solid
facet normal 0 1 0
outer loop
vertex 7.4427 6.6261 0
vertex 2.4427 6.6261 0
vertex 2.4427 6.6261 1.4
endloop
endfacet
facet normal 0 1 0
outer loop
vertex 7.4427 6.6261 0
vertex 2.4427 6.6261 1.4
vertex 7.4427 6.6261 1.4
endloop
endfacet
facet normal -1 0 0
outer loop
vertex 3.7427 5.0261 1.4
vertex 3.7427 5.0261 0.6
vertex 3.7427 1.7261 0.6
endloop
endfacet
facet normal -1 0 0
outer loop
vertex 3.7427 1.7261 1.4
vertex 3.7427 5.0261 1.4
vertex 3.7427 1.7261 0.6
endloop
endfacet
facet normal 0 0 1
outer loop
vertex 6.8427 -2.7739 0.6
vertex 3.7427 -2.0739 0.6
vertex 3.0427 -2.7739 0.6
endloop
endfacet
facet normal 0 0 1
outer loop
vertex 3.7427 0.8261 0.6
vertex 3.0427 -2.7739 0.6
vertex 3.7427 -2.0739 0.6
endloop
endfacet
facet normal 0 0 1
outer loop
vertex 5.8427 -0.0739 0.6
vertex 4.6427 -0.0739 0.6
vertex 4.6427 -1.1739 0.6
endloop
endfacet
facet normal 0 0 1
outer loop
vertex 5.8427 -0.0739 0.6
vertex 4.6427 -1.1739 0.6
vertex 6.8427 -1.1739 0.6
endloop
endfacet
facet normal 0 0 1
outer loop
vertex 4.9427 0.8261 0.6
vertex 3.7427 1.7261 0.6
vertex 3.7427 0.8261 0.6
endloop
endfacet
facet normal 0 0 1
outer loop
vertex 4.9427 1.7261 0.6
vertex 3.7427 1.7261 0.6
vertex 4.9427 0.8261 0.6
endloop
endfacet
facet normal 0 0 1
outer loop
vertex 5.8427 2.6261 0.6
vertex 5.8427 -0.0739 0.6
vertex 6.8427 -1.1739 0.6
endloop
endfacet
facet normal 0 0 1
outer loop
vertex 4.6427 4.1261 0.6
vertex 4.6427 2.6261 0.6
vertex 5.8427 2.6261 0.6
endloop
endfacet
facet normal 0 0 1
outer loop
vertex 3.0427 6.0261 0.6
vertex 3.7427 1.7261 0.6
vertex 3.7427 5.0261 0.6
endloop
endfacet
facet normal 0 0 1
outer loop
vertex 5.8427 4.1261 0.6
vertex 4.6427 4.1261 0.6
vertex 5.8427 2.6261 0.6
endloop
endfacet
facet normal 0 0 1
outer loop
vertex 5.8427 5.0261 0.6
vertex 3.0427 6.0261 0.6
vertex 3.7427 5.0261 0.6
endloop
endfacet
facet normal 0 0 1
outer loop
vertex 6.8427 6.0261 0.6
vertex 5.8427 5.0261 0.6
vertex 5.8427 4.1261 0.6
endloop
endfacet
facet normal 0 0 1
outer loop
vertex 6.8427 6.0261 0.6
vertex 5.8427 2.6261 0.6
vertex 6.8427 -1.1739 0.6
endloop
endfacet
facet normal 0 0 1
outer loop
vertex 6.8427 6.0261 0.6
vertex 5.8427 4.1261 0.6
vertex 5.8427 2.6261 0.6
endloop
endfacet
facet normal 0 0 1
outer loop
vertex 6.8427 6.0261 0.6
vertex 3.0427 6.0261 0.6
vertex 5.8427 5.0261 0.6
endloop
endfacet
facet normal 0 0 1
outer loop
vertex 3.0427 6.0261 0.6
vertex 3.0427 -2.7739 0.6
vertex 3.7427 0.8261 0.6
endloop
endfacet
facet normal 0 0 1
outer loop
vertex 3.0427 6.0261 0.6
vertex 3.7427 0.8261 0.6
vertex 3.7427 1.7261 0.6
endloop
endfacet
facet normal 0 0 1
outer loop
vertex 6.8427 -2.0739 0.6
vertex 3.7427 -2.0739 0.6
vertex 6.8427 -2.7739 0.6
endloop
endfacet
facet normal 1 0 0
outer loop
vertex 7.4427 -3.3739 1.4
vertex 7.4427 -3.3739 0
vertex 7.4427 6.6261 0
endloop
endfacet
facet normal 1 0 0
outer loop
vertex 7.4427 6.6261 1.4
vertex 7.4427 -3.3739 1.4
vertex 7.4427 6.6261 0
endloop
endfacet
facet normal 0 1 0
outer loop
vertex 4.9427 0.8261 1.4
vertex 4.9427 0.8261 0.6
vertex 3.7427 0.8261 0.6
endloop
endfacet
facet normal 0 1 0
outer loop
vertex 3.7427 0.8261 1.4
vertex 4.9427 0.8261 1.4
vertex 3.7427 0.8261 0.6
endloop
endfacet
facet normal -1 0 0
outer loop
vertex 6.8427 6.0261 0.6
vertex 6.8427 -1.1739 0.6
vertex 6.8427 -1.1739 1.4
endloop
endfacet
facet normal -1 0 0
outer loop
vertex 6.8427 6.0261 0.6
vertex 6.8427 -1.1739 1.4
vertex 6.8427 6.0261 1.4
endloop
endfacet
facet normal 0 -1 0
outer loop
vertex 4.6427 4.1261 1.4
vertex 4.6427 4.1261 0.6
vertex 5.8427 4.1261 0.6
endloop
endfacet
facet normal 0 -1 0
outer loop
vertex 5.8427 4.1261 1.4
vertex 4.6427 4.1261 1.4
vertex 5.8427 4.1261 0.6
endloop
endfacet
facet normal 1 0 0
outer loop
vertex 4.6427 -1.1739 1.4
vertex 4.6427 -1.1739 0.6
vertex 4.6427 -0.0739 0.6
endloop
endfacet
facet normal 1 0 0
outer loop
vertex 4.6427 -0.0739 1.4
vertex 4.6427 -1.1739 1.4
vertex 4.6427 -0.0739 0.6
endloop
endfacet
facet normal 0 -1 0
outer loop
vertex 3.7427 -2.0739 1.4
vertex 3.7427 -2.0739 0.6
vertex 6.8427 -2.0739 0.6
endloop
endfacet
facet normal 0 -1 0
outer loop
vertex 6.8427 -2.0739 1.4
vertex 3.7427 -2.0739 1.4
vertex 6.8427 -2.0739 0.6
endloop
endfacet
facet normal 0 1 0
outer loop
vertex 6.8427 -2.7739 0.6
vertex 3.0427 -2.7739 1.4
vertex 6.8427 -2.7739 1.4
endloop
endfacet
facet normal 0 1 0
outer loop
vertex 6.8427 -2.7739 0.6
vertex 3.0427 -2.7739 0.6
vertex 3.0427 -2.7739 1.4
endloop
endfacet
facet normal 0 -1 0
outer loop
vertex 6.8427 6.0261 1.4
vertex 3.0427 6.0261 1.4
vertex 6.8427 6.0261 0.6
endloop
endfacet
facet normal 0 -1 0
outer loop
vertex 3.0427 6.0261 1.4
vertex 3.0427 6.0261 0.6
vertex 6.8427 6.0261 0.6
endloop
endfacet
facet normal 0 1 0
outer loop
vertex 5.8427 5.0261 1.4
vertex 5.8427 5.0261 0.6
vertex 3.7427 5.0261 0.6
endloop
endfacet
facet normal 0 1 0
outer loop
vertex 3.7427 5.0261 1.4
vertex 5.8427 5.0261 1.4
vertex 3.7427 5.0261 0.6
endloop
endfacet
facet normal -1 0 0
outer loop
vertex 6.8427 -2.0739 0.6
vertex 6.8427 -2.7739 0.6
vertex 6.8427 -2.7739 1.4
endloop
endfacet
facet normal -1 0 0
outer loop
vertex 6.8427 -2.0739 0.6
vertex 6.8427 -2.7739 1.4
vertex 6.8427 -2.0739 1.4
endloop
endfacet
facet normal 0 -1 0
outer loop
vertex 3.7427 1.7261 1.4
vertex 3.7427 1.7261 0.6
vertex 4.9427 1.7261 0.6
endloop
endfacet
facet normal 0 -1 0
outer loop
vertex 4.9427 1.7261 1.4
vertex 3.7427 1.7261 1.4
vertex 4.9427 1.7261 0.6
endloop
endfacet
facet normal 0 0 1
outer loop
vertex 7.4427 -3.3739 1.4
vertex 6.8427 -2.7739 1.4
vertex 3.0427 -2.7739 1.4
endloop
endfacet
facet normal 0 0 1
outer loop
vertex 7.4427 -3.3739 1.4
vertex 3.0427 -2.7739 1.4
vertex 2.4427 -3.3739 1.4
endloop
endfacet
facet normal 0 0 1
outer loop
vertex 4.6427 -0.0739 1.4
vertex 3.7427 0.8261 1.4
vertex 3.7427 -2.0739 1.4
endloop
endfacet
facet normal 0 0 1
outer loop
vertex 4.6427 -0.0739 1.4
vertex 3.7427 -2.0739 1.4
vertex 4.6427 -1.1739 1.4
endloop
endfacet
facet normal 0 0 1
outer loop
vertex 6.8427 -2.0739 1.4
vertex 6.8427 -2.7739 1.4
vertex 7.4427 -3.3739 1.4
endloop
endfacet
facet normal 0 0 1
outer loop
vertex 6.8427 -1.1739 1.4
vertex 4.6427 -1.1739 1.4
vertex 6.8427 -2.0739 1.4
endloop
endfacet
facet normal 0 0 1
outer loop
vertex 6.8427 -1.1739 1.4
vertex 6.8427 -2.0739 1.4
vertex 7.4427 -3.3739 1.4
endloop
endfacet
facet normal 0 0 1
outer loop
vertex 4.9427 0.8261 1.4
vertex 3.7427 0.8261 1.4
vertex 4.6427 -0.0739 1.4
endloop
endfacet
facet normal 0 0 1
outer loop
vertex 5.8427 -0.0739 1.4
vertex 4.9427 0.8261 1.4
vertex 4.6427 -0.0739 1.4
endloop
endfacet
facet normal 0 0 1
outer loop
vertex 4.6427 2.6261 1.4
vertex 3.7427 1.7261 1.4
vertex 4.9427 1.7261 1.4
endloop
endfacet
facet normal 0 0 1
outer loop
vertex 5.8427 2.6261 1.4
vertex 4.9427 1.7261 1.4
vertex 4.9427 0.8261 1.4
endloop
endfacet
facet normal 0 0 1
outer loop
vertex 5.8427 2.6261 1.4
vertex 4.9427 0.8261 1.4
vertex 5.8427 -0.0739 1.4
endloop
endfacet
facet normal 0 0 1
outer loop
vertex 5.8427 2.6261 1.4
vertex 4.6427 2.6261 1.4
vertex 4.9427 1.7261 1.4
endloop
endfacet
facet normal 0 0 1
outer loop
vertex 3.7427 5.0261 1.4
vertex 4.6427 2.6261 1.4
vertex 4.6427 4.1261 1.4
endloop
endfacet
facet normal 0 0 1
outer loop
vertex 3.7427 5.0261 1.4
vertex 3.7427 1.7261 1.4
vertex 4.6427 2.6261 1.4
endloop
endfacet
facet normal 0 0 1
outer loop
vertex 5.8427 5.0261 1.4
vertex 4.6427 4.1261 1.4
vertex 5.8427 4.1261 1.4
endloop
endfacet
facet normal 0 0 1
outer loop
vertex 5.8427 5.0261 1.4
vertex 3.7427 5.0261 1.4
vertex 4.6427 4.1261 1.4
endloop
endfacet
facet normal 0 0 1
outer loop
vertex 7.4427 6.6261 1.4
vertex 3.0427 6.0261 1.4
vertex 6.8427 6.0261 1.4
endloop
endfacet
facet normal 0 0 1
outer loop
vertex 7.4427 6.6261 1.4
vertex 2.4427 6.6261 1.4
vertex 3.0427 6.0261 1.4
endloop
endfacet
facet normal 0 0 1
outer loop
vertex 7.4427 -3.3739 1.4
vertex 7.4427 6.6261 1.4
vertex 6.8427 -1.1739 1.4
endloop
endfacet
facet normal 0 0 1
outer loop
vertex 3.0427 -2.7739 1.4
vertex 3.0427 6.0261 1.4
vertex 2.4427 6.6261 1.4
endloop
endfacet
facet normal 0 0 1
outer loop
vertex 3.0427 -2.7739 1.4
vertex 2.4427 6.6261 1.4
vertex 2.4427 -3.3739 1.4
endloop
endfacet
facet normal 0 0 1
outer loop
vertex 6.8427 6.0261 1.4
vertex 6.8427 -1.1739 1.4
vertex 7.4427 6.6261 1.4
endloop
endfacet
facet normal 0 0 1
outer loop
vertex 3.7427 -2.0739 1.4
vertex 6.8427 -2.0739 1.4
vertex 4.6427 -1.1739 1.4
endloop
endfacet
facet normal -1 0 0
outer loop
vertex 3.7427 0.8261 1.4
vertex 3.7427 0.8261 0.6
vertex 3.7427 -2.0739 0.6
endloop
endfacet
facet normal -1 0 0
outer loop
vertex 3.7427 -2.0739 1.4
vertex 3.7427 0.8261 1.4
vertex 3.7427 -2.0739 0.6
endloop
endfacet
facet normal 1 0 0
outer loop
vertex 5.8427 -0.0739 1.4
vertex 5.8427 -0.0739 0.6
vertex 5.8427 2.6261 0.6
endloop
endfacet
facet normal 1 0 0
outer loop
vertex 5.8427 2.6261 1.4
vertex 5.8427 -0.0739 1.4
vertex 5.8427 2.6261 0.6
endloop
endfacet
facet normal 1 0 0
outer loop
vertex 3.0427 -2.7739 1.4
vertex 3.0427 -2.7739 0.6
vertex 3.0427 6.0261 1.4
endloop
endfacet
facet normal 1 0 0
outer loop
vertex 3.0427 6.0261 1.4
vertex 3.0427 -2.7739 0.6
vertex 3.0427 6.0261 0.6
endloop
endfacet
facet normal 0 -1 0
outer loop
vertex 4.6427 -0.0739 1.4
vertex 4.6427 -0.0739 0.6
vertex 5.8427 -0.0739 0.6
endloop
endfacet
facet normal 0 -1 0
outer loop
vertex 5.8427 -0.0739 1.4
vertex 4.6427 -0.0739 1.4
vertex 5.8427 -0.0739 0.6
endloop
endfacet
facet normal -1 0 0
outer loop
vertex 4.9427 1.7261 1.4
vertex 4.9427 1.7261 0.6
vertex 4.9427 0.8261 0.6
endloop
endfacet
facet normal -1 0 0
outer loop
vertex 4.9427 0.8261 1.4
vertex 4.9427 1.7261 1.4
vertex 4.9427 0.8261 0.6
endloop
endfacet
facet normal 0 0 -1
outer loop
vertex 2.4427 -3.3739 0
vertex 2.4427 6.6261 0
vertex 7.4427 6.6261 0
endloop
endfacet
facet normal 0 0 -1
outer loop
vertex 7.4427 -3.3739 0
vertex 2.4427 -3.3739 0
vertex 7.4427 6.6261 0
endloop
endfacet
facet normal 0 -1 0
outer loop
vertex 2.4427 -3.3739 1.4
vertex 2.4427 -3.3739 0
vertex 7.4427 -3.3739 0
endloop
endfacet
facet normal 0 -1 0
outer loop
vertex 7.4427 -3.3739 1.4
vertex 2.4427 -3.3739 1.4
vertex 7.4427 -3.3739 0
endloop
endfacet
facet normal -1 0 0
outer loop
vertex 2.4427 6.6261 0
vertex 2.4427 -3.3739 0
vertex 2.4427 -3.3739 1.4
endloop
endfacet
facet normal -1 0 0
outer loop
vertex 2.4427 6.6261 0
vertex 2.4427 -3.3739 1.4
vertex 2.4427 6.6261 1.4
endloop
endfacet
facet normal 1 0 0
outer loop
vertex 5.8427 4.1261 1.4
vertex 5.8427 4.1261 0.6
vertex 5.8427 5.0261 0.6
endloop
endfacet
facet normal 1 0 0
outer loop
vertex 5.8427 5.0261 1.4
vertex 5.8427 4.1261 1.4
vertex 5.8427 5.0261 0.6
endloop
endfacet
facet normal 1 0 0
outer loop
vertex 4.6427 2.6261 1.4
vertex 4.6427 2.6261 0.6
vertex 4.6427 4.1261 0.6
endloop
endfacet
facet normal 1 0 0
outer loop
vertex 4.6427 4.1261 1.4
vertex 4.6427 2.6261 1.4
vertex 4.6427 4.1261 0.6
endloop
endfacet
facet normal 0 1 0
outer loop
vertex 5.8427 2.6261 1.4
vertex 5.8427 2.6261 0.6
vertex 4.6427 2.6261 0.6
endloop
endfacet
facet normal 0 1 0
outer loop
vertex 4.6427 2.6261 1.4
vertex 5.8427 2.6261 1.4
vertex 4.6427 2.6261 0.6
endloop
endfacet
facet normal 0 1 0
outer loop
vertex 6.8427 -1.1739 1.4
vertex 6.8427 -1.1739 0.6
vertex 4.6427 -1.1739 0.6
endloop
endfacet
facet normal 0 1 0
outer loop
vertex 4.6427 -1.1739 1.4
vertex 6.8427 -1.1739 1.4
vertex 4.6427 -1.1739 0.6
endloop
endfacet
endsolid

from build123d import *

# Parameters (mm, degrees)
F0_W     = 5
F0_H     = 10
F1_DEPTH = 1.4
F2_T     = -0.6
F4_DEPTH = 0.8


with BuildPart() as f1:
    # F0 (on Top) → F1 (new body)
    with BuildSketch(Plane.XY):
        with Locations((4.9427011982, 1.6260683693)):
            Rectangle(F0_W, F0_H)
    extrude(amount=F1_DEPTH)

    # F2
    f2_openings = [f1.faces().sort_by_distance(p)[0] for p in [
        (4.942701, 1.626068, 1.4),
    ]]
    offset(amount=F2_T, openings=f2_openings)

    # F3 (on face) → F4 (join)
    with BuildSketch(Plane.XY.offset(0.6)):
        Polygon((6.8427011982, -2.0739316307), (6.8427011982, -1.1739316307), (4.6427011982, -1.1739316307), (4.6427011982, -0.0739316307), (5.8427011982, -0.0739316307), (5.8427011982, 2.6260683693), (4.6427011982, 2.6260683693), (4.6427011982, 4.1260683693), (5.8427011982, 4.1260683693), (5.8427011982, 5.0260683693), (3.7427011982, 5.0260683693), (3.7427011982, 1.7260683693), (4.9427011982, 1.7260683693), (4.9427011982, 0.8260683693), (3.7427011982, 0.8260683693), (3.7427011982, -2.0739316307), align=None)
    extrude(amount=F4_DEPTH)


solid = f1.part
